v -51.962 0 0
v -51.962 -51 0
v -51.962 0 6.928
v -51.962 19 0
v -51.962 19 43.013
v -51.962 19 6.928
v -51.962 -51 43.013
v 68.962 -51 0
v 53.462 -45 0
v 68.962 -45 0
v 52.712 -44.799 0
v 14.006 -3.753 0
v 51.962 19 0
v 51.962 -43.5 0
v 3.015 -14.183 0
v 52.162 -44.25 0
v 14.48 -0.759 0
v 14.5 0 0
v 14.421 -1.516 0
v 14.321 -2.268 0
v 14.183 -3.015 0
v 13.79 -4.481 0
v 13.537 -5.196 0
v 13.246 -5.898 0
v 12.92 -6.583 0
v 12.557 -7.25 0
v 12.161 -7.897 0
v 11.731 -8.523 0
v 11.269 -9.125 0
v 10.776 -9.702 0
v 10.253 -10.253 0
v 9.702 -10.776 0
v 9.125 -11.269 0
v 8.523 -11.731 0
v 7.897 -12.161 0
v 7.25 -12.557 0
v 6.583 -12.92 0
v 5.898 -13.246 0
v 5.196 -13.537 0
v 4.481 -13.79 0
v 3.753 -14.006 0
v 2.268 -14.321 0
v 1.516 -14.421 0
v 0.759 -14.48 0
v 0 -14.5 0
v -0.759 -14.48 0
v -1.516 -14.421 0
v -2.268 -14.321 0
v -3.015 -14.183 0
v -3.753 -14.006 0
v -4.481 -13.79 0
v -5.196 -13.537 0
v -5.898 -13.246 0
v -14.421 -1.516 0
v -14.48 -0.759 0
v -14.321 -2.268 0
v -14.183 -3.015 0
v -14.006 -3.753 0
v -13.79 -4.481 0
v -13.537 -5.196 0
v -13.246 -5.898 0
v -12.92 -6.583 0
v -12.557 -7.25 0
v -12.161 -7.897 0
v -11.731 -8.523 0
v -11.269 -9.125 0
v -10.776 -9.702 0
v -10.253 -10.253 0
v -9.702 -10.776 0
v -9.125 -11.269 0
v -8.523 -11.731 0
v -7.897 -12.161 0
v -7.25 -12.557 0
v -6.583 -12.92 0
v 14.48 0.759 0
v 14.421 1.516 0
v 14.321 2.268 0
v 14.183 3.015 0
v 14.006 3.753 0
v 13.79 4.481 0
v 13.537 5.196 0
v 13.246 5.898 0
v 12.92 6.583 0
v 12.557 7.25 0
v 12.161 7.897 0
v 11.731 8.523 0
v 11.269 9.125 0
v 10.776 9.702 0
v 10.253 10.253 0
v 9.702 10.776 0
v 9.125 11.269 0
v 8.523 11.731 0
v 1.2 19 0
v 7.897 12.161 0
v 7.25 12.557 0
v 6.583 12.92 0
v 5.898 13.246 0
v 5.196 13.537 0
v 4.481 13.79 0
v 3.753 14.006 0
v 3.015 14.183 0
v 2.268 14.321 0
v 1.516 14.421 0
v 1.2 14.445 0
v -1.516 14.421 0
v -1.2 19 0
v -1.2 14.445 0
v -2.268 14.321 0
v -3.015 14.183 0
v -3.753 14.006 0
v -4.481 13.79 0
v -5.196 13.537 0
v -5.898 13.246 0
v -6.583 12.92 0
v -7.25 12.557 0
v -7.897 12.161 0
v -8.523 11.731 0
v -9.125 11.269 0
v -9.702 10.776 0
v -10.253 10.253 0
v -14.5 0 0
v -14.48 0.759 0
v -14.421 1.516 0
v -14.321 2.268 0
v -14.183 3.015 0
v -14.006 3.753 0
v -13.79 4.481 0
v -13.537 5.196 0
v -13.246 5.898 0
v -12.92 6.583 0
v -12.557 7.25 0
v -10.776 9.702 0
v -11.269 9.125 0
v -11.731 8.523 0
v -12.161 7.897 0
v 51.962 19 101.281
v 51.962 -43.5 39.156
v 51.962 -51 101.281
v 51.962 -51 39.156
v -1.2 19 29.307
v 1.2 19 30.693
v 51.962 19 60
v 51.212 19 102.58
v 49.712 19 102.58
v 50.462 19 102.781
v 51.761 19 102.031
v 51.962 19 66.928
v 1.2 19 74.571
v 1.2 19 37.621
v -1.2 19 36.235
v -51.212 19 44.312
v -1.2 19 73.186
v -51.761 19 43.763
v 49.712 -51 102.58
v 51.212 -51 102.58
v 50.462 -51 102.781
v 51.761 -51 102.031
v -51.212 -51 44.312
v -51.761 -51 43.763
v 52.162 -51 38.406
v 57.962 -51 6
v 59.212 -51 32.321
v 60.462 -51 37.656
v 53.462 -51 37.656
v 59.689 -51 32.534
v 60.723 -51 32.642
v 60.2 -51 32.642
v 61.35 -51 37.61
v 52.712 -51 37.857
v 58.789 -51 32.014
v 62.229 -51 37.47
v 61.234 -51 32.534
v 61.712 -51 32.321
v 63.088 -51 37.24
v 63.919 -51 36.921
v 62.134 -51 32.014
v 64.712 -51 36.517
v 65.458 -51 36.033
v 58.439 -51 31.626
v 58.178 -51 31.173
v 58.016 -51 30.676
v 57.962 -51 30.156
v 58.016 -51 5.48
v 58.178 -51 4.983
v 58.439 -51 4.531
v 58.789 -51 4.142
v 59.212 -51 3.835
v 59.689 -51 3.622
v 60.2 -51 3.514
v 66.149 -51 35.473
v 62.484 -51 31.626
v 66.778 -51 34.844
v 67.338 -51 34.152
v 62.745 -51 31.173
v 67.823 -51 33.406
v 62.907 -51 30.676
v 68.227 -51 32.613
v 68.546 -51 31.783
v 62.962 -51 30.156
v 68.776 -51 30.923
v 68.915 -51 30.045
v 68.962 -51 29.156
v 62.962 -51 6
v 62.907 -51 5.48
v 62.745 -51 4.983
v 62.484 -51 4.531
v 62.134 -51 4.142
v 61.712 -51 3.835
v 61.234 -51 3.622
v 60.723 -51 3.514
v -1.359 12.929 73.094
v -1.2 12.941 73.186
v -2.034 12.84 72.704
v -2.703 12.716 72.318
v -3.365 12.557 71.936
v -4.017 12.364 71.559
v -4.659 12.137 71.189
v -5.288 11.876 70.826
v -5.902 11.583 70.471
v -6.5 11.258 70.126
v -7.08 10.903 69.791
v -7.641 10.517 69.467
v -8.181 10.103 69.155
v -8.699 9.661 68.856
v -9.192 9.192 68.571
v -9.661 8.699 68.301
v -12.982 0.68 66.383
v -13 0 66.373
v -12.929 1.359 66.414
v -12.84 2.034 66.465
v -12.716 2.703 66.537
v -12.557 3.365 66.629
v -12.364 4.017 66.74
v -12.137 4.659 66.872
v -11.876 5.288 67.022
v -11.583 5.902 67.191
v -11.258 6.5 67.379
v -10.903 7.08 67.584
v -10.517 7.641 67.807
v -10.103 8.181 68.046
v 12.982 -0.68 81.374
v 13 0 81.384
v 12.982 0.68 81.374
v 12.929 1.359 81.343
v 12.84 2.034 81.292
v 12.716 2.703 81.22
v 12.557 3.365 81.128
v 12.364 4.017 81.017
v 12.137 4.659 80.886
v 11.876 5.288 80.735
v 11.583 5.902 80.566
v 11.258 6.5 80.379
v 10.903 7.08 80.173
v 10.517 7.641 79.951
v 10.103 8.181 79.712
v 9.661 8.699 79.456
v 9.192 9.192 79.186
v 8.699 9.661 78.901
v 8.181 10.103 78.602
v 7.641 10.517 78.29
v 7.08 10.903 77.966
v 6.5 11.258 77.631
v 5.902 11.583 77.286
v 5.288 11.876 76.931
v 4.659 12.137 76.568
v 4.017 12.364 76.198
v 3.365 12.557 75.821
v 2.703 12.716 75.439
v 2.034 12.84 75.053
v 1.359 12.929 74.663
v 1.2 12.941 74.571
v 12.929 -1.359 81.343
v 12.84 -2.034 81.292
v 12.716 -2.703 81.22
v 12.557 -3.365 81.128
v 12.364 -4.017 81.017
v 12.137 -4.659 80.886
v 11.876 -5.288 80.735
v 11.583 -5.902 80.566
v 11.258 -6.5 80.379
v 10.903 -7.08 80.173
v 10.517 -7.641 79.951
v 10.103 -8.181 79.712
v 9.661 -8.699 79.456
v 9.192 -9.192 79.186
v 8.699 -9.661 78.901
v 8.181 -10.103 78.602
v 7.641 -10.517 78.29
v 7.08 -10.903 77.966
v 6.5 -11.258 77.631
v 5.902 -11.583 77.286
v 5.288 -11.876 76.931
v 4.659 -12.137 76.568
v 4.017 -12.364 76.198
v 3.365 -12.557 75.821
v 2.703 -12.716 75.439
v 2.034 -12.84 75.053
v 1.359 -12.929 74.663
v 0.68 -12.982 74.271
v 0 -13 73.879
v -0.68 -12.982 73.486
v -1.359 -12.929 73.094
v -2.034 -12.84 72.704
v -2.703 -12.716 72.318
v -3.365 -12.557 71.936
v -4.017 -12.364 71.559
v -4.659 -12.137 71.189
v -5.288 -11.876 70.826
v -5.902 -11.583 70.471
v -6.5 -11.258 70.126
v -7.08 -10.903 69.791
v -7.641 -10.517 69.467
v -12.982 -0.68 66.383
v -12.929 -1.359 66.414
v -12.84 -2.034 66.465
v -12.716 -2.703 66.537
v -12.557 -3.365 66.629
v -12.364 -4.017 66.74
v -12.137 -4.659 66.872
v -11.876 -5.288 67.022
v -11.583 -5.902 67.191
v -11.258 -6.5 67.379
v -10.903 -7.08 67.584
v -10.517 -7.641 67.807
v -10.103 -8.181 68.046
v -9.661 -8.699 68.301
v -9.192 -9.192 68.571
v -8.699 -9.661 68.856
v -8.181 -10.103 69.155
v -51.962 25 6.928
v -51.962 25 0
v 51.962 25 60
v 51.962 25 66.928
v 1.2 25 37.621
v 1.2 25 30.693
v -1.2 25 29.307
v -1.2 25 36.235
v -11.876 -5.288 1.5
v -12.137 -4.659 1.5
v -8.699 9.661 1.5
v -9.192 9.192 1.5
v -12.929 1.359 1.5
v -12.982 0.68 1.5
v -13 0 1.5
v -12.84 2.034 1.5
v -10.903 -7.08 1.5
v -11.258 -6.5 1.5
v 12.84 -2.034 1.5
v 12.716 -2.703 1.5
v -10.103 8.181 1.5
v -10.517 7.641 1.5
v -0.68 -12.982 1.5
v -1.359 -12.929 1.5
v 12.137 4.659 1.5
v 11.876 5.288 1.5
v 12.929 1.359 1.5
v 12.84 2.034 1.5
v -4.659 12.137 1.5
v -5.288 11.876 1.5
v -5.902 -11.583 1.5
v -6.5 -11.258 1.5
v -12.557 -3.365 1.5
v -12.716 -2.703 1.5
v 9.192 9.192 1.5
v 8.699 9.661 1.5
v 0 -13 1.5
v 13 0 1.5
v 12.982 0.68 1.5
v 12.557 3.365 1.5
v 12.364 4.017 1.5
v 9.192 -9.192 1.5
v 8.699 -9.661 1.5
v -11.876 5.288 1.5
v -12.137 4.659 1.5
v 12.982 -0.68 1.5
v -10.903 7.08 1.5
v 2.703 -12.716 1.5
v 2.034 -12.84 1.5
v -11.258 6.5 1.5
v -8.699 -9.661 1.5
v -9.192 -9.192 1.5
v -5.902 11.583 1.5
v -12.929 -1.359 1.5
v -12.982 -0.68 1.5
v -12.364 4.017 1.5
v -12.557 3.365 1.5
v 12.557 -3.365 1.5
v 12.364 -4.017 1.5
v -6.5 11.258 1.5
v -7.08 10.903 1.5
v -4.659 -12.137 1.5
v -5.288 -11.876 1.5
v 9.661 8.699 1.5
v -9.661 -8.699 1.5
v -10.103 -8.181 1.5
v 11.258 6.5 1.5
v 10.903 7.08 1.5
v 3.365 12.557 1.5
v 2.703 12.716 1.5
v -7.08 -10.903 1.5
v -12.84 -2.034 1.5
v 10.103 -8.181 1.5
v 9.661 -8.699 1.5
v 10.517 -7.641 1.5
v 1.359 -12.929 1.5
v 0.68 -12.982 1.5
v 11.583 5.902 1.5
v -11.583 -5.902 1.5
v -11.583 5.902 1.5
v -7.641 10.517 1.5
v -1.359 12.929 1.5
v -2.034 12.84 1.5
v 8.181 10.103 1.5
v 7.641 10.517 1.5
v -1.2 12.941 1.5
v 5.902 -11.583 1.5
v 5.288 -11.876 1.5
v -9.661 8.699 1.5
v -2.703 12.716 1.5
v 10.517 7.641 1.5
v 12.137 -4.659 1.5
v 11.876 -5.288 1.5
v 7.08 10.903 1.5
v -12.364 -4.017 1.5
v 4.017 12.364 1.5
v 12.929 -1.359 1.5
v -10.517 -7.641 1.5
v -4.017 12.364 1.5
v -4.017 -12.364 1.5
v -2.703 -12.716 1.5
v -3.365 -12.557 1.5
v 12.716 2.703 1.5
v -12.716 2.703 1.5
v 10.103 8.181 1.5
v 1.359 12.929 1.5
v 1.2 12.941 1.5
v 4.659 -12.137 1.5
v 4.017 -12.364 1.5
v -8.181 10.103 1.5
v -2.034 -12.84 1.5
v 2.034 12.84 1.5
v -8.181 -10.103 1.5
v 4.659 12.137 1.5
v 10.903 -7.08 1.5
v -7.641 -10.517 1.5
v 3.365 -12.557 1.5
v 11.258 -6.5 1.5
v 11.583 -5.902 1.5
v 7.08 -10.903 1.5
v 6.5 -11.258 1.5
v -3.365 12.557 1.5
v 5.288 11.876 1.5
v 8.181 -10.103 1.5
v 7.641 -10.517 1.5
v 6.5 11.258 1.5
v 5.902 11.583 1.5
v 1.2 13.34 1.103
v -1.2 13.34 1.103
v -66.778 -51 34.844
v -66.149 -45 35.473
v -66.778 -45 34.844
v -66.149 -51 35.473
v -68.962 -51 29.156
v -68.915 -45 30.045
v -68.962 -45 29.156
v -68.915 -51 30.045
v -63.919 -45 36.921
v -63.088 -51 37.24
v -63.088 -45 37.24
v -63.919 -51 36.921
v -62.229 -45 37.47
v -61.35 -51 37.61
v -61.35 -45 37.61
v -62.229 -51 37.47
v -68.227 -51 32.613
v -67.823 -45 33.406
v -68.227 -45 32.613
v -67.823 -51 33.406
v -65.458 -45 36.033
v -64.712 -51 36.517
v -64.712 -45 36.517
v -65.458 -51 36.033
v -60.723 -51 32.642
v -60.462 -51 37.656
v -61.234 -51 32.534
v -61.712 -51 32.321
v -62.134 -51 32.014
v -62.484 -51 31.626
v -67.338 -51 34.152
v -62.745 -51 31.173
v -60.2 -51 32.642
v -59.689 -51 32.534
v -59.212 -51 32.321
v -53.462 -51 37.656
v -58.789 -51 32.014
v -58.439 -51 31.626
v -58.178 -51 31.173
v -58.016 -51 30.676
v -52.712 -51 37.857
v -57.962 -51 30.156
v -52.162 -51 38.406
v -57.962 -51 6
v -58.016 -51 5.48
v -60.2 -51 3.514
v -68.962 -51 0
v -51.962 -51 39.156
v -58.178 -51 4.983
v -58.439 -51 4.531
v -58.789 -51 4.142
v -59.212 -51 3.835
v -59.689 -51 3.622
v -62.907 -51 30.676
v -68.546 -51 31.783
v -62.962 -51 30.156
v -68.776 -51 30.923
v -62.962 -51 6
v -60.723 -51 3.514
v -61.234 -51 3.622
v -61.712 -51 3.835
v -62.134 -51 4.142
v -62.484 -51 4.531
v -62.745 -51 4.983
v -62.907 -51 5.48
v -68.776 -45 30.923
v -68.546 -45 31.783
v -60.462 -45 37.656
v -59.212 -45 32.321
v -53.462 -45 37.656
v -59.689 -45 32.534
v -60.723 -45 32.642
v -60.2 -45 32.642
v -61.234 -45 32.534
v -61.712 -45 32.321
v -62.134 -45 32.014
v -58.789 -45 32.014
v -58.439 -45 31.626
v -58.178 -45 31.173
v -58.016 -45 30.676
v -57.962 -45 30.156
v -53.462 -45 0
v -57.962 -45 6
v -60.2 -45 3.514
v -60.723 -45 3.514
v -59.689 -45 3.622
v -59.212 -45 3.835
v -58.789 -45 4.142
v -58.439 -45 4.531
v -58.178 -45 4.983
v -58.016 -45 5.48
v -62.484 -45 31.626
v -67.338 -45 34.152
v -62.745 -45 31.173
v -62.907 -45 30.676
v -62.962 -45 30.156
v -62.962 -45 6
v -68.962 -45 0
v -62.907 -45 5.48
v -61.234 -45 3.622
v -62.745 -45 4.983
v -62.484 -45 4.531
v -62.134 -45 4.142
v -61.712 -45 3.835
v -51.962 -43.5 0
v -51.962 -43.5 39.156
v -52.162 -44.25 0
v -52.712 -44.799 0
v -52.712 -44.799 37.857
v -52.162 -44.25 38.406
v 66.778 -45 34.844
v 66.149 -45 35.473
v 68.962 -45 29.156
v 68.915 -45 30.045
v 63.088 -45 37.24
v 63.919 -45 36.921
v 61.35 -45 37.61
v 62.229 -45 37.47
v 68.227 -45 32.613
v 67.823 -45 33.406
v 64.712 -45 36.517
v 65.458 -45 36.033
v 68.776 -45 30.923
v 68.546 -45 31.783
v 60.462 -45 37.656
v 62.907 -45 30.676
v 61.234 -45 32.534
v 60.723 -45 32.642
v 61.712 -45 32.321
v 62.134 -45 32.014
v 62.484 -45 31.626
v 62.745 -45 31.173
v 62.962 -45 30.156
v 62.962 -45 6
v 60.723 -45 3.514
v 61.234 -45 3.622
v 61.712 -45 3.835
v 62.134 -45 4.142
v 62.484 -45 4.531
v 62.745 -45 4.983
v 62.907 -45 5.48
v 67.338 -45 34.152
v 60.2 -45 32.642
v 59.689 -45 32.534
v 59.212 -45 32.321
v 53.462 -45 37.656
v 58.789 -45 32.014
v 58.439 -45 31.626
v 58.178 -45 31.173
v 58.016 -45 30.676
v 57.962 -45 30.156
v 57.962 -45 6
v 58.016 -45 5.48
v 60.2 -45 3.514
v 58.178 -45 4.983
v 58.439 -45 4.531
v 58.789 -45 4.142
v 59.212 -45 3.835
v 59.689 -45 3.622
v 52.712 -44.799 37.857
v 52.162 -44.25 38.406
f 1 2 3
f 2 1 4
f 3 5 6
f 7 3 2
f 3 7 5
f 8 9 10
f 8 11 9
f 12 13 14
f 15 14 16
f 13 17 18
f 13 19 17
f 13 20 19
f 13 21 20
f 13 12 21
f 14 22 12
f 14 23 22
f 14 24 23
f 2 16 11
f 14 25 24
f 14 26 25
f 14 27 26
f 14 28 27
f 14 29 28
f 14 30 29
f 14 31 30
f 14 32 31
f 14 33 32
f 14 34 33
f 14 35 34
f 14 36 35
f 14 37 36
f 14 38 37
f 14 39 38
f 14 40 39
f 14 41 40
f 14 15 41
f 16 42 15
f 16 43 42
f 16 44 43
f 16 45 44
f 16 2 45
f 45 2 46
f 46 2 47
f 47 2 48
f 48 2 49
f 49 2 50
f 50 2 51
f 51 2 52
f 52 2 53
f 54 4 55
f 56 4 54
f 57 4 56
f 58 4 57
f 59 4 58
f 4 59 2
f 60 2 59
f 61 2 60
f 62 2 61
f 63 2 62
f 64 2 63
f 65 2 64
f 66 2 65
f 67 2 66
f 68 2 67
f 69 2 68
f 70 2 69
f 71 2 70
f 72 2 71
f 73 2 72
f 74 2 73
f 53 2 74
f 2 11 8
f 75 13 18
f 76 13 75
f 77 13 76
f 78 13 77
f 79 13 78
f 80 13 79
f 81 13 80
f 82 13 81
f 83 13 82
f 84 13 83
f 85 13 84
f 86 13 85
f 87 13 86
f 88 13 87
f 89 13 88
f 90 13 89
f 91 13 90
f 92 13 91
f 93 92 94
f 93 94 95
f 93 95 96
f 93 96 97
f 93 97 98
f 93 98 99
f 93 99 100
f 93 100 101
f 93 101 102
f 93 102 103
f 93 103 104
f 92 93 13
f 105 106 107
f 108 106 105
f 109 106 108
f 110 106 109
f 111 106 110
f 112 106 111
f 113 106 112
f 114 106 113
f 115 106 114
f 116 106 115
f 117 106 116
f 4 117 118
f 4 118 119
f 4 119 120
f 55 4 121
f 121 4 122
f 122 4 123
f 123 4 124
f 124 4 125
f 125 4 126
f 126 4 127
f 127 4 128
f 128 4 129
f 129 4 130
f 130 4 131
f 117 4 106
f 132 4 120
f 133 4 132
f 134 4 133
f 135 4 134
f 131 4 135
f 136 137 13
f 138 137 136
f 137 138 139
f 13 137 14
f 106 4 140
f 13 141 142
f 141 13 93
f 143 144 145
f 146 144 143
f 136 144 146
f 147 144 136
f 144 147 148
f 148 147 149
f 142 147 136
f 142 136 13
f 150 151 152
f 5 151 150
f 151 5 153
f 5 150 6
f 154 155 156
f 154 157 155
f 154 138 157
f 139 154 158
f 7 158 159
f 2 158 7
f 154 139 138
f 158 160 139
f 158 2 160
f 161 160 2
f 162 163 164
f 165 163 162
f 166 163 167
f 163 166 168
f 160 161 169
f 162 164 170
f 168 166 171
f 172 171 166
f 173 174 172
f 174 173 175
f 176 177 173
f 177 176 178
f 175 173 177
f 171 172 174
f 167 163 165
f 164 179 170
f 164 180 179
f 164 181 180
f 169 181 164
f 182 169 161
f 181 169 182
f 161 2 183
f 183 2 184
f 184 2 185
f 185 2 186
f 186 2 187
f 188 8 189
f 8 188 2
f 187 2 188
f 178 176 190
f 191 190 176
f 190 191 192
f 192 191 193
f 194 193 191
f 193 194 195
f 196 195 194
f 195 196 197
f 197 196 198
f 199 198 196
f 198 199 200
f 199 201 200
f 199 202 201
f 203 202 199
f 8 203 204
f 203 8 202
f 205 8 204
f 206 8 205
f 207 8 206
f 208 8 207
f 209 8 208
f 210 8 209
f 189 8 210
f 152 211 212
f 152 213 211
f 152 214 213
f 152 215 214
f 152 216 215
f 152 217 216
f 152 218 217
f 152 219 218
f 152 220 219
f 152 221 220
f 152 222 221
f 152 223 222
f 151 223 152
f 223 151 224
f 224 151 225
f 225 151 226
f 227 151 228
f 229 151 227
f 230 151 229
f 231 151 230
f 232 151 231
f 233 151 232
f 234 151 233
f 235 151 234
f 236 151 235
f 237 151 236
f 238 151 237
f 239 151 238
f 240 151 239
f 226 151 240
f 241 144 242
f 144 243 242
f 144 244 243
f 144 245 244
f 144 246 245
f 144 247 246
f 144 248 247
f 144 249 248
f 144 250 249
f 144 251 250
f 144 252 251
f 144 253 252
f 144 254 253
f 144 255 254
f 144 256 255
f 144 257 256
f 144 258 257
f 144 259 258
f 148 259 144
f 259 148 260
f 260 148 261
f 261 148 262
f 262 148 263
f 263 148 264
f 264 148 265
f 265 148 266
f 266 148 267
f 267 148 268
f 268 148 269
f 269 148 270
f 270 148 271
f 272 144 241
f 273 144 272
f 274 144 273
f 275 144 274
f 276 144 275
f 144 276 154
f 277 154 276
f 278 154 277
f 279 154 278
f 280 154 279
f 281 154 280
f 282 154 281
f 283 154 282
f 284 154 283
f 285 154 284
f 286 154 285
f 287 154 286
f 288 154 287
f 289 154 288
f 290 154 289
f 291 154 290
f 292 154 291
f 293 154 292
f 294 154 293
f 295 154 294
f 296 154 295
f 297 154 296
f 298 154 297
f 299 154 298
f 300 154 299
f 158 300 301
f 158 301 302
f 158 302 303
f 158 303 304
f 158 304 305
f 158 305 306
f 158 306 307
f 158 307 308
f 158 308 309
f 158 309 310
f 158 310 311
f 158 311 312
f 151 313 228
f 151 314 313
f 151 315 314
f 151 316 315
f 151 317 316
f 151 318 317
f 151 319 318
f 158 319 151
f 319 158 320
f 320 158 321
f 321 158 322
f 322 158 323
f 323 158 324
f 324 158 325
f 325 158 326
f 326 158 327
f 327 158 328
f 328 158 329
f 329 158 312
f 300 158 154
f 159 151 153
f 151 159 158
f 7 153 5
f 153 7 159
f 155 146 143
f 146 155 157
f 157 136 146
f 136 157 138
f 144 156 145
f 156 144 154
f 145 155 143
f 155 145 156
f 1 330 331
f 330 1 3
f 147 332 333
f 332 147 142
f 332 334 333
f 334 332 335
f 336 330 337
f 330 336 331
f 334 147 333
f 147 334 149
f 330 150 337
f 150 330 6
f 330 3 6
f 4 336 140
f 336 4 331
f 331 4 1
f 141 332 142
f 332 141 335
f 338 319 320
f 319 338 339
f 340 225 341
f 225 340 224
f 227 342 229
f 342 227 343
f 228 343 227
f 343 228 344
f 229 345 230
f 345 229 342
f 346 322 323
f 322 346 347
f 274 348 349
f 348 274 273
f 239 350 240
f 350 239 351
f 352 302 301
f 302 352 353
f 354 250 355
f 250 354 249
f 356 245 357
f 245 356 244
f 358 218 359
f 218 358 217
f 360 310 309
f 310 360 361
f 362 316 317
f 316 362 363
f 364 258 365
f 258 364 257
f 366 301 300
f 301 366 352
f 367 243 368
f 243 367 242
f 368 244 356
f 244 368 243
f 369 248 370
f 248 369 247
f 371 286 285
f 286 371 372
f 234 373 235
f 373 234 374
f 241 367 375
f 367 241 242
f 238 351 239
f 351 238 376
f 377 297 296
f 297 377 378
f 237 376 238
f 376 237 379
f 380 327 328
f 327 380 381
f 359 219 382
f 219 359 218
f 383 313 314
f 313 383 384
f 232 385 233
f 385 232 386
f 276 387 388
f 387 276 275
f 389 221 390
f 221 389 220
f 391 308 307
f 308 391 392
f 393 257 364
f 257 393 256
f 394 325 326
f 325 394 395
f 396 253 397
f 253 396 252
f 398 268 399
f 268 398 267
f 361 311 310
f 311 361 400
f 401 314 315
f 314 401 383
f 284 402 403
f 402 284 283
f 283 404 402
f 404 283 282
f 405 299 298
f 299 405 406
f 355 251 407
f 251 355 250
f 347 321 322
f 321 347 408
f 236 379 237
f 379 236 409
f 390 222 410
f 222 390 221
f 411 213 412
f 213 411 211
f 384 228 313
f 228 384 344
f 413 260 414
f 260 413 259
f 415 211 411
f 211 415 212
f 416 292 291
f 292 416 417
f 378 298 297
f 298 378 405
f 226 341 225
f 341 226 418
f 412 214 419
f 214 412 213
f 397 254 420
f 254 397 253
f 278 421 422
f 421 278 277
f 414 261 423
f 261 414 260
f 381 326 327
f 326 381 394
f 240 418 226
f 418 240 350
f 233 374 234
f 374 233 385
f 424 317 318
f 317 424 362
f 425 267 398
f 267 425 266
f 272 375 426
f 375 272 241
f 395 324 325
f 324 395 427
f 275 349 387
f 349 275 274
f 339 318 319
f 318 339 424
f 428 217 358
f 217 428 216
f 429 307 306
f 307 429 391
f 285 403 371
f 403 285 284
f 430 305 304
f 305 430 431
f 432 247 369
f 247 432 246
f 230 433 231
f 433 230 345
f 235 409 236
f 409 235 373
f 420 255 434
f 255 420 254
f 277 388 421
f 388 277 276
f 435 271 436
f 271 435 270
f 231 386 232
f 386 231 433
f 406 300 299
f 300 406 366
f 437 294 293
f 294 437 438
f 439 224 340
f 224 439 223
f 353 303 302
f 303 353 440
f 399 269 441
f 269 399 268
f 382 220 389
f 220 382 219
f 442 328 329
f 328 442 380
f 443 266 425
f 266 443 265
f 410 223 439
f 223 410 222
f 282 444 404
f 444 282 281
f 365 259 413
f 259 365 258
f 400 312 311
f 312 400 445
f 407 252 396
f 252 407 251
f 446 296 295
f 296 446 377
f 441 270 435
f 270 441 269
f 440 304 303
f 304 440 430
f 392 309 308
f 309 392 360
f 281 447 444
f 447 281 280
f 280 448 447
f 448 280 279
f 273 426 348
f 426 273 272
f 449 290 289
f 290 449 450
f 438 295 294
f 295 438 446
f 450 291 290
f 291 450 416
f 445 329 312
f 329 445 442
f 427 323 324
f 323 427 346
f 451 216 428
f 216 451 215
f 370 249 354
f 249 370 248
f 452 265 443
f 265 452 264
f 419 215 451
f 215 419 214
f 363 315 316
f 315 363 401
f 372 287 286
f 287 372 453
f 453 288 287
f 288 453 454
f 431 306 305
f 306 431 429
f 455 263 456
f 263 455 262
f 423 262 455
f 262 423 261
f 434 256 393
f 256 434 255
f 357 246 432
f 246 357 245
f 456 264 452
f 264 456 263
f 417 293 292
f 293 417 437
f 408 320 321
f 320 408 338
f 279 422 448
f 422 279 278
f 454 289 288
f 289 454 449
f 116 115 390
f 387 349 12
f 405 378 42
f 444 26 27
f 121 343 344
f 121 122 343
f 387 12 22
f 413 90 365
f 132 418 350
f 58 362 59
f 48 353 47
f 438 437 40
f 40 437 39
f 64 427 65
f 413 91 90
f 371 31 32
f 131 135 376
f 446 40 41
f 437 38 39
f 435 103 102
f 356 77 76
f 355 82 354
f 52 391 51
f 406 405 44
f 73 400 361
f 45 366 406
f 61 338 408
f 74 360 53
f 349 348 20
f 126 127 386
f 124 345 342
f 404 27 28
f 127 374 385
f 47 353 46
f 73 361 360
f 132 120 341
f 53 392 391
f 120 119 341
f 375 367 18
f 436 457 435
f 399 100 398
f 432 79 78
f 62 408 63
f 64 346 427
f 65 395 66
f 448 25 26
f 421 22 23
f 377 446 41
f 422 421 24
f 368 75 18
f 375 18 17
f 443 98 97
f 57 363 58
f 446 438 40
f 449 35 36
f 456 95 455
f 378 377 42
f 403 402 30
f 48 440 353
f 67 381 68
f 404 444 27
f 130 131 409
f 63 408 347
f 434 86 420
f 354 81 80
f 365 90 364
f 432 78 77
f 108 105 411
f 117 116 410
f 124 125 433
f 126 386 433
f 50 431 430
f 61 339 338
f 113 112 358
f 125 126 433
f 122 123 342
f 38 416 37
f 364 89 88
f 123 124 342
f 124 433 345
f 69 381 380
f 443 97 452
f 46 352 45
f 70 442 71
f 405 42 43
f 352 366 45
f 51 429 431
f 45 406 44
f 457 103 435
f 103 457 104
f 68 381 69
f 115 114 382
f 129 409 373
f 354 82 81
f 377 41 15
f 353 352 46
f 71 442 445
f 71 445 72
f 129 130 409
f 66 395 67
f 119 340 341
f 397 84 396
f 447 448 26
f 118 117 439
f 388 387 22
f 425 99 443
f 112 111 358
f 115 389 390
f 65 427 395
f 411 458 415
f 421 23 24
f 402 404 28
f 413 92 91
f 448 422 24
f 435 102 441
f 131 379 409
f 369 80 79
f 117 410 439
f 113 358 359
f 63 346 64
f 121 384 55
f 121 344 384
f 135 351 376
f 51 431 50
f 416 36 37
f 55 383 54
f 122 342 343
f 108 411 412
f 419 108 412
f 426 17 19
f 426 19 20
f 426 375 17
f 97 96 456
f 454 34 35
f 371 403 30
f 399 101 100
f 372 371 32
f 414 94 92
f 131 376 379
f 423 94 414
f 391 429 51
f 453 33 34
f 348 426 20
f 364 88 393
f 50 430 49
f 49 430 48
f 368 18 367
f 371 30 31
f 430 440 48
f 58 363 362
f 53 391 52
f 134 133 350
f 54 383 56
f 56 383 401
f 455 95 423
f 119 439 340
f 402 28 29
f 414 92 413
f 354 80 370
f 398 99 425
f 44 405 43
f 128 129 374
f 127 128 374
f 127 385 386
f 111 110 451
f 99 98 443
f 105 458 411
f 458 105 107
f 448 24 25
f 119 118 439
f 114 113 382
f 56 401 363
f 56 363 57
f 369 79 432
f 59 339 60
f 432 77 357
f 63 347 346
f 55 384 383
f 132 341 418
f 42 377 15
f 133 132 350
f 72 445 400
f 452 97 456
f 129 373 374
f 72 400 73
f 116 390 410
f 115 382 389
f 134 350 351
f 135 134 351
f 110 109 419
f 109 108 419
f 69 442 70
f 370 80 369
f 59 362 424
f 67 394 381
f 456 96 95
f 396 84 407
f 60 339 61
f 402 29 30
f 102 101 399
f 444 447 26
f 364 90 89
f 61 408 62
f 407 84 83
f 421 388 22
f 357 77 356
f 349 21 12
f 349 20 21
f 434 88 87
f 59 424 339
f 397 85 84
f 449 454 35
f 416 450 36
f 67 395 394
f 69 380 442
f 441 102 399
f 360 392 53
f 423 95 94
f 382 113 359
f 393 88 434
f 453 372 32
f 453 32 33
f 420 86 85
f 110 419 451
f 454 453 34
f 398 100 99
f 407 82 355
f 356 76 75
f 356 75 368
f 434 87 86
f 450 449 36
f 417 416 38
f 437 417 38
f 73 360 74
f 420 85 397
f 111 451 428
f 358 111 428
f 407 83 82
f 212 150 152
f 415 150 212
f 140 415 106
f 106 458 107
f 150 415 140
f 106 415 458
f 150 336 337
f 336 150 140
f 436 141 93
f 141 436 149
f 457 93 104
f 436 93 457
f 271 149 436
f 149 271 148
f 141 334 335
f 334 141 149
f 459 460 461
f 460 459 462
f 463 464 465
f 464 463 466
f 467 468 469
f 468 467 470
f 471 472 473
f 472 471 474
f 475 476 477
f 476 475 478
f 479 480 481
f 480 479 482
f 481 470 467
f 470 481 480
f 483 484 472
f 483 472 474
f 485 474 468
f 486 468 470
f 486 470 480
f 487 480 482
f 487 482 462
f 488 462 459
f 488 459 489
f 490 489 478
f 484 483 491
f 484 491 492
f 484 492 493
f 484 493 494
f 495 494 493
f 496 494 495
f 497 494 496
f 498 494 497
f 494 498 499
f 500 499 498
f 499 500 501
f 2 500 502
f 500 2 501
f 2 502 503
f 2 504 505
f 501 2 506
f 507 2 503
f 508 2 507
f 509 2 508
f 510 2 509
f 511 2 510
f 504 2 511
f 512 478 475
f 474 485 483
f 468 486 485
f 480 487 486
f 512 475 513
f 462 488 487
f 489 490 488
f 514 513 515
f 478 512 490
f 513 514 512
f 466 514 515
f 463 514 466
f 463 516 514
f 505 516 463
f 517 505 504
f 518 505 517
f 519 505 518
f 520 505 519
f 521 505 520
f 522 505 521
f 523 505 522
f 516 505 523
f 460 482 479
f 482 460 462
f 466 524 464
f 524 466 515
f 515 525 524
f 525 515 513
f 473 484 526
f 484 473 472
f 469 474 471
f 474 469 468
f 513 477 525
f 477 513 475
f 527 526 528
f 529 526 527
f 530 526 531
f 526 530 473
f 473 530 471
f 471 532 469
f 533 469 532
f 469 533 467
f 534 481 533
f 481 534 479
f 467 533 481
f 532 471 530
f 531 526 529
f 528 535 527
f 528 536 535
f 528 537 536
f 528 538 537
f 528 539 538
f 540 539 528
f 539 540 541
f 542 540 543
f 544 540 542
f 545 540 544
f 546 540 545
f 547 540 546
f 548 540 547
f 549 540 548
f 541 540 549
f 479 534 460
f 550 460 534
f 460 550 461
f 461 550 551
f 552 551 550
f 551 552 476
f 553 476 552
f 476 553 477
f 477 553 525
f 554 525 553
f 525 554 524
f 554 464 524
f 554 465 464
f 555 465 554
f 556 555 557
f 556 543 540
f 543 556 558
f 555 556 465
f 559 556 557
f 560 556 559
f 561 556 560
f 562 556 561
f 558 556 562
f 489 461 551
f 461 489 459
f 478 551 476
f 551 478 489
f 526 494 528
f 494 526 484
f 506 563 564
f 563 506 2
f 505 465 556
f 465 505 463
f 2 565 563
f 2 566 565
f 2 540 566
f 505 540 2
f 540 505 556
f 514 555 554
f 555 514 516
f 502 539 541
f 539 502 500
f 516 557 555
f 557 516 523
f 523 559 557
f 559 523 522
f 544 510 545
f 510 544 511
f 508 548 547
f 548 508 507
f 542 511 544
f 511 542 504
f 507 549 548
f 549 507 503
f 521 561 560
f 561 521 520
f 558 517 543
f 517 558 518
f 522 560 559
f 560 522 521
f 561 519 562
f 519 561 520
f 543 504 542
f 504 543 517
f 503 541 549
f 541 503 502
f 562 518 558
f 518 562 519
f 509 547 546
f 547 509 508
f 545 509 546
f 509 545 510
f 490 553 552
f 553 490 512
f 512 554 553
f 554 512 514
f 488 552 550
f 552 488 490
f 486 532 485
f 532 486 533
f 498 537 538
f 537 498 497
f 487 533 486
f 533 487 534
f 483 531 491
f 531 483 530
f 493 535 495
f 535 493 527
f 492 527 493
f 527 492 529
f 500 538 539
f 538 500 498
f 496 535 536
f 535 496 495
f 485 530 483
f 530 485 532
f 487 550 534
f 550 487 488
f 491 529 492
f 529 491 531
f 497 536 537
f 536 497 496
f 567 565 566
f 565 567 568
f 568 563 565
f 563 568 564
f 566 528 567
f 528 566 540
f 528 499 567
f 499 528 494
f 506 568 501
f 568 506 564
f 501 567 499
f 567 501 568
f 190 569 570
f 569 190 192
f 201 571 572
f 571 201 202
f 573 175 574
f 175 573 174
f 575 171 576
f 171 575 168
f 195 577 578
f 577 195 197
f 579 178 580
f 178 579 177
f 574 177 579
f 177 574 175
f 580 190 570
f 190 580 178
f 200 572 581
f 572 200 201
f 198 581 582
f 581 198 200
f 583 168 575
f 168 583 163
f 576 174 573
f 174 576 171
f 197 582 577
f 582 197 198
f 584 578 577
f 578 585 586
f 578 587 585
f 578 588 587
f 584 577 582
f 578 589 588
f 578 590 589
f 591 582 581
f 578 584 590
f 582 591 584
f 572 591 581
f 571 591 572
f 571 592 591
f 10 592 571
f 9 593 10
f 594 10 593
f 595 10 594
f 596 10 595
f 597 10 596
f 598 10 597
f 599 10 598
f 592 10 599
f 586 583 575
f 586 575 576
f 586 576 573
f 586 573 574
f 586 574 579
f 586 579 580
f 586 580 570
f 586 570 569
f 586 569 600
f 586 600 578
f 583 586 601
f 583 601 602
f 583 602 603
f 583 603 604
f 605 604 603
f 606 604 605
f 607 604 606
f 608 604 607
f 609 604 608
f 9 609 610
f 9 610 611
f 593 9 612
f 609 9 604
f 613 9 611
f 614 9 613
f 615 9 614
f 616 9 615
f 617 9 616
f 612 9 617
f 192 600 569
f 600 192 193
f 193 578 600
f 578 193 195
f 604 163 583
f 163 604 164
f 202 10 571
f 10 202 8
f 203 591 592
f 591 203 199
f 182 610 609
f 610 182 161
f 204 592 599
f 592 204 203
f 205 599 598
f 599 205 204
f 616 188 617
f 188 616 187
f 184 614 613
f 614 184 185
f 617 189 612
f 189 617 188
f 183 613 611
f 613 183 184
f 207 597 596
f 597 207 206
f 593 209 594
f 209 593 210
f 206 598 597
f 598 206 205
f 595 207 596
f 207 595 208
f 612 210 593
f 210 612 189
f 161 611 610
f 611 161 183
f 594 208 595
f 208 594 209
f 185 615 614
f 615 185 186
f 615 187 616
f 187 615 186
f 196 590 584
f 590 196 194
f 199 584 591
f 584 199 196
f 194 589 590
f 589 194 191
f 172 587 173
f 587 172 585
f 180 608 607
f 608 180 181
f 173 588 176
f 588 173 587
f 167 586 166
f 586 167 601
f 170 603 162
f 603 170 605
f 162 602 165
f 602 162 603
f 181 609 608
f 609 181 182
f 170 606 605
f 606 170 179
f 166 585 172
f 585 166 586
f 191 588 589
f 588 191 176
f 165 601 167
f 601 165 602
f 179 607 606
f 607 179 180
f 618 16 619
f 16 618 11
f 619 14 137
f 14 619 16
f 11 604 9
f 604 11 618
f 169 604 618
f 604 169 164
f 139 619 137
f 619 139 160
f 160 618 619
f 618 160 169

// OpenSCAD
// pipe cutting jig
// by Stellar Innovation
// http://www.thingiverse.com/stellarinnovation/about
// licensed under the Creative Commons - Attribution license. 

pipe_diam = 26; // [3.0:0.1:40.0]
angle = 60;     // [15:90]
jig_width = 32; // [20:100]
jig_length=120; // [50:150]
jig_depth = 70; // [20:100]
bolt_diam = 5;  // [3:0.1:8]
wall = 6;       // [3:0.5:10]
slope = "uphill";  // [uphill,downhill]

if (slope=="uphill")
  mirror([1, 0, 0])
    PipeCuttingJigPart();
else
  PipeCuttingJigPart();


module PipeCuttingJigPart()  {
  width = max(pipe_diam + 2*wall, jig_length*sin(angle));
  depth = max(pipe_diam + 2*wall, jig_depth);
  offset_y = depth - wall - 0.5*pipe_diam;
  guide_height = wall/sin(angle);
  extra_height = width*cos(angle)/sin(angle);
  height = jig_width/sin(angle) + guide_height + extra_height;
  corner_r = 1.5;
  slot_width = 2.4;

  difference() {
    union() {
      // main block
      translate([-0.5*width, -offset_y])
        ClampBlock(width, depth, height - extra_height, height, corner_r);
      
      guide_depth = 0.5*pipe_diam + 2*wall;
      difference() {
        // guide
        translate([-0.5*width, 0])
          cube([width, guide_depth, guide_height+extra_height]);
          
        // slope of guide
        h0 = 0.5*extra_height;
        cut_length = 1.01*width/sin(angle);
        translate([0, 0, h0 + guide_height])
          rotate([0, 90-angle])
            translate([-0.5*cut_length, 0])
              cube([cut_length, guide_depth, 2*extra_height]);
        translate([0, 0, h0])
          rotate([0, 90-angle])
            translate([-0.5*cut_length, 0, -2*extra_height])
              cube([cut_length, guide_depth, 2*extra_height]);
      }
      
    }    
    // hole for the pipe
    cylinder(d=pipe_diam, h=height, $fn=120);
    // chamfer
    cylinder(d1=pipe_diam + 2*corner_r, d2=pipe_diam, h=corner_r, $fn=120);
    
    // Slot used to clamp the pipe
    translate([-0.5*slot_width, 0])
      cube([slot_width, 0.5*depth+2*wall, height]);
  }
  
  // Rails
  fancy_corners = corner_r*(1 + tan(0.5*angle));
  tangent = (wall + 0.5*bolt_diam)*(tan(90-0.5*angle) - 1);
  rail_height = height - extra_height - max(fancy_corners, tangent);
  translate([0.5*width, -offset_y])
    Rail(rail_height, wall);
  translate([-0.5*width, -offset_y])
    mirror([1,0,0])
      Rail(rail_height, wall);
}

module ClampBlock(width, depth, h1, h2, corner_r) {
  // "fancy" right corner
  dz1 = corner_r*tan(0.5*angle);
  dx1 = corner_r*(1-cos(angle));
  // "fancy" left corner
  dz2 = corner_r*tan(90-0.5*angle);
  dx2 = corner_r*(1+cos(angle));
  
  difference() {
    // main block
    cube([width, depth, h2]);
    
    // leaning cut
    cut_length = 1.01*width/sin(angle);
    translate([0, 0, h2])
      rotate([0, 90-angle])
          cube([cut_length, depth + wall, 2*max(h2 - h1, width)]);
    
    // Cut outs for fancy corners
    translate([width-dx1, 0, h1-dz1])
      cube([dx1, depth, corner_r]);
    translate([0, 0, h2-dz2])
      cube([dx2, depth, dz2]);
  }
  
  // fancy corners
  translate([width-corner_r, 0, h1-dz1])
    rotate([-90,0])
      cylinder(r=corner_r, h=depth, $fn=12);
  translate([corner_r, 0, h2-dz2])
    rotate([-90,0])
      cylinder(r=corner_r, h=depth, $fn=12);
}

module Rail(height, thickness) {
  width = bolt_diam + 2*thickness;
  r = 0.5*width;
  fillet_r = 1.5;
  difference() {
    union() {
      // main rail
      cube([width, thickness, height - r]); 
      translate([0, 0, height - r]) {
        // rounded end
        rotate([-90, 0])
          translate([r, 0])
            cylinder(d=width, h=thickness, $fn=60);
        // fills in gap (makes round end a quarter circle)
        cube([r, thickness, r]);        
      }
      // fillet
      cube([fillet_r, thickness+fillet_r, height + fillet_r]);
    }
      
    // slot
    translate([r, 0, r - 0.5*bolt_diam])
      rotate([90, 0]) {
        slot_h = height - r;
        bolt_r = 0.5*bolt_diam;
        translate([-bolt_r, 0, -thickness])
          cube([bolt_diam,  slot_h - bolt_diam, 2*thickness]);
        cylinder(d=bolt_diam, h=2*thickness, $fn=30, center=true);
        translate([0, slot_h - bolt_diam])
          cylinder(d=bolt_diam, h=2*thickness, $fn=30, center=true);
      }
      
    // fillet
    translate([fillet_r, thickness+fillet_r])
      cylinder(r=fillet_r, h=height + fillet_r, $fn=12);
    translate([fillet_r, 0, height+fillet_r])
      rotate([90, 0])
        cylinder(r=fillet_r, h=3*thickness, center=true, $fn=12);
  }
}
